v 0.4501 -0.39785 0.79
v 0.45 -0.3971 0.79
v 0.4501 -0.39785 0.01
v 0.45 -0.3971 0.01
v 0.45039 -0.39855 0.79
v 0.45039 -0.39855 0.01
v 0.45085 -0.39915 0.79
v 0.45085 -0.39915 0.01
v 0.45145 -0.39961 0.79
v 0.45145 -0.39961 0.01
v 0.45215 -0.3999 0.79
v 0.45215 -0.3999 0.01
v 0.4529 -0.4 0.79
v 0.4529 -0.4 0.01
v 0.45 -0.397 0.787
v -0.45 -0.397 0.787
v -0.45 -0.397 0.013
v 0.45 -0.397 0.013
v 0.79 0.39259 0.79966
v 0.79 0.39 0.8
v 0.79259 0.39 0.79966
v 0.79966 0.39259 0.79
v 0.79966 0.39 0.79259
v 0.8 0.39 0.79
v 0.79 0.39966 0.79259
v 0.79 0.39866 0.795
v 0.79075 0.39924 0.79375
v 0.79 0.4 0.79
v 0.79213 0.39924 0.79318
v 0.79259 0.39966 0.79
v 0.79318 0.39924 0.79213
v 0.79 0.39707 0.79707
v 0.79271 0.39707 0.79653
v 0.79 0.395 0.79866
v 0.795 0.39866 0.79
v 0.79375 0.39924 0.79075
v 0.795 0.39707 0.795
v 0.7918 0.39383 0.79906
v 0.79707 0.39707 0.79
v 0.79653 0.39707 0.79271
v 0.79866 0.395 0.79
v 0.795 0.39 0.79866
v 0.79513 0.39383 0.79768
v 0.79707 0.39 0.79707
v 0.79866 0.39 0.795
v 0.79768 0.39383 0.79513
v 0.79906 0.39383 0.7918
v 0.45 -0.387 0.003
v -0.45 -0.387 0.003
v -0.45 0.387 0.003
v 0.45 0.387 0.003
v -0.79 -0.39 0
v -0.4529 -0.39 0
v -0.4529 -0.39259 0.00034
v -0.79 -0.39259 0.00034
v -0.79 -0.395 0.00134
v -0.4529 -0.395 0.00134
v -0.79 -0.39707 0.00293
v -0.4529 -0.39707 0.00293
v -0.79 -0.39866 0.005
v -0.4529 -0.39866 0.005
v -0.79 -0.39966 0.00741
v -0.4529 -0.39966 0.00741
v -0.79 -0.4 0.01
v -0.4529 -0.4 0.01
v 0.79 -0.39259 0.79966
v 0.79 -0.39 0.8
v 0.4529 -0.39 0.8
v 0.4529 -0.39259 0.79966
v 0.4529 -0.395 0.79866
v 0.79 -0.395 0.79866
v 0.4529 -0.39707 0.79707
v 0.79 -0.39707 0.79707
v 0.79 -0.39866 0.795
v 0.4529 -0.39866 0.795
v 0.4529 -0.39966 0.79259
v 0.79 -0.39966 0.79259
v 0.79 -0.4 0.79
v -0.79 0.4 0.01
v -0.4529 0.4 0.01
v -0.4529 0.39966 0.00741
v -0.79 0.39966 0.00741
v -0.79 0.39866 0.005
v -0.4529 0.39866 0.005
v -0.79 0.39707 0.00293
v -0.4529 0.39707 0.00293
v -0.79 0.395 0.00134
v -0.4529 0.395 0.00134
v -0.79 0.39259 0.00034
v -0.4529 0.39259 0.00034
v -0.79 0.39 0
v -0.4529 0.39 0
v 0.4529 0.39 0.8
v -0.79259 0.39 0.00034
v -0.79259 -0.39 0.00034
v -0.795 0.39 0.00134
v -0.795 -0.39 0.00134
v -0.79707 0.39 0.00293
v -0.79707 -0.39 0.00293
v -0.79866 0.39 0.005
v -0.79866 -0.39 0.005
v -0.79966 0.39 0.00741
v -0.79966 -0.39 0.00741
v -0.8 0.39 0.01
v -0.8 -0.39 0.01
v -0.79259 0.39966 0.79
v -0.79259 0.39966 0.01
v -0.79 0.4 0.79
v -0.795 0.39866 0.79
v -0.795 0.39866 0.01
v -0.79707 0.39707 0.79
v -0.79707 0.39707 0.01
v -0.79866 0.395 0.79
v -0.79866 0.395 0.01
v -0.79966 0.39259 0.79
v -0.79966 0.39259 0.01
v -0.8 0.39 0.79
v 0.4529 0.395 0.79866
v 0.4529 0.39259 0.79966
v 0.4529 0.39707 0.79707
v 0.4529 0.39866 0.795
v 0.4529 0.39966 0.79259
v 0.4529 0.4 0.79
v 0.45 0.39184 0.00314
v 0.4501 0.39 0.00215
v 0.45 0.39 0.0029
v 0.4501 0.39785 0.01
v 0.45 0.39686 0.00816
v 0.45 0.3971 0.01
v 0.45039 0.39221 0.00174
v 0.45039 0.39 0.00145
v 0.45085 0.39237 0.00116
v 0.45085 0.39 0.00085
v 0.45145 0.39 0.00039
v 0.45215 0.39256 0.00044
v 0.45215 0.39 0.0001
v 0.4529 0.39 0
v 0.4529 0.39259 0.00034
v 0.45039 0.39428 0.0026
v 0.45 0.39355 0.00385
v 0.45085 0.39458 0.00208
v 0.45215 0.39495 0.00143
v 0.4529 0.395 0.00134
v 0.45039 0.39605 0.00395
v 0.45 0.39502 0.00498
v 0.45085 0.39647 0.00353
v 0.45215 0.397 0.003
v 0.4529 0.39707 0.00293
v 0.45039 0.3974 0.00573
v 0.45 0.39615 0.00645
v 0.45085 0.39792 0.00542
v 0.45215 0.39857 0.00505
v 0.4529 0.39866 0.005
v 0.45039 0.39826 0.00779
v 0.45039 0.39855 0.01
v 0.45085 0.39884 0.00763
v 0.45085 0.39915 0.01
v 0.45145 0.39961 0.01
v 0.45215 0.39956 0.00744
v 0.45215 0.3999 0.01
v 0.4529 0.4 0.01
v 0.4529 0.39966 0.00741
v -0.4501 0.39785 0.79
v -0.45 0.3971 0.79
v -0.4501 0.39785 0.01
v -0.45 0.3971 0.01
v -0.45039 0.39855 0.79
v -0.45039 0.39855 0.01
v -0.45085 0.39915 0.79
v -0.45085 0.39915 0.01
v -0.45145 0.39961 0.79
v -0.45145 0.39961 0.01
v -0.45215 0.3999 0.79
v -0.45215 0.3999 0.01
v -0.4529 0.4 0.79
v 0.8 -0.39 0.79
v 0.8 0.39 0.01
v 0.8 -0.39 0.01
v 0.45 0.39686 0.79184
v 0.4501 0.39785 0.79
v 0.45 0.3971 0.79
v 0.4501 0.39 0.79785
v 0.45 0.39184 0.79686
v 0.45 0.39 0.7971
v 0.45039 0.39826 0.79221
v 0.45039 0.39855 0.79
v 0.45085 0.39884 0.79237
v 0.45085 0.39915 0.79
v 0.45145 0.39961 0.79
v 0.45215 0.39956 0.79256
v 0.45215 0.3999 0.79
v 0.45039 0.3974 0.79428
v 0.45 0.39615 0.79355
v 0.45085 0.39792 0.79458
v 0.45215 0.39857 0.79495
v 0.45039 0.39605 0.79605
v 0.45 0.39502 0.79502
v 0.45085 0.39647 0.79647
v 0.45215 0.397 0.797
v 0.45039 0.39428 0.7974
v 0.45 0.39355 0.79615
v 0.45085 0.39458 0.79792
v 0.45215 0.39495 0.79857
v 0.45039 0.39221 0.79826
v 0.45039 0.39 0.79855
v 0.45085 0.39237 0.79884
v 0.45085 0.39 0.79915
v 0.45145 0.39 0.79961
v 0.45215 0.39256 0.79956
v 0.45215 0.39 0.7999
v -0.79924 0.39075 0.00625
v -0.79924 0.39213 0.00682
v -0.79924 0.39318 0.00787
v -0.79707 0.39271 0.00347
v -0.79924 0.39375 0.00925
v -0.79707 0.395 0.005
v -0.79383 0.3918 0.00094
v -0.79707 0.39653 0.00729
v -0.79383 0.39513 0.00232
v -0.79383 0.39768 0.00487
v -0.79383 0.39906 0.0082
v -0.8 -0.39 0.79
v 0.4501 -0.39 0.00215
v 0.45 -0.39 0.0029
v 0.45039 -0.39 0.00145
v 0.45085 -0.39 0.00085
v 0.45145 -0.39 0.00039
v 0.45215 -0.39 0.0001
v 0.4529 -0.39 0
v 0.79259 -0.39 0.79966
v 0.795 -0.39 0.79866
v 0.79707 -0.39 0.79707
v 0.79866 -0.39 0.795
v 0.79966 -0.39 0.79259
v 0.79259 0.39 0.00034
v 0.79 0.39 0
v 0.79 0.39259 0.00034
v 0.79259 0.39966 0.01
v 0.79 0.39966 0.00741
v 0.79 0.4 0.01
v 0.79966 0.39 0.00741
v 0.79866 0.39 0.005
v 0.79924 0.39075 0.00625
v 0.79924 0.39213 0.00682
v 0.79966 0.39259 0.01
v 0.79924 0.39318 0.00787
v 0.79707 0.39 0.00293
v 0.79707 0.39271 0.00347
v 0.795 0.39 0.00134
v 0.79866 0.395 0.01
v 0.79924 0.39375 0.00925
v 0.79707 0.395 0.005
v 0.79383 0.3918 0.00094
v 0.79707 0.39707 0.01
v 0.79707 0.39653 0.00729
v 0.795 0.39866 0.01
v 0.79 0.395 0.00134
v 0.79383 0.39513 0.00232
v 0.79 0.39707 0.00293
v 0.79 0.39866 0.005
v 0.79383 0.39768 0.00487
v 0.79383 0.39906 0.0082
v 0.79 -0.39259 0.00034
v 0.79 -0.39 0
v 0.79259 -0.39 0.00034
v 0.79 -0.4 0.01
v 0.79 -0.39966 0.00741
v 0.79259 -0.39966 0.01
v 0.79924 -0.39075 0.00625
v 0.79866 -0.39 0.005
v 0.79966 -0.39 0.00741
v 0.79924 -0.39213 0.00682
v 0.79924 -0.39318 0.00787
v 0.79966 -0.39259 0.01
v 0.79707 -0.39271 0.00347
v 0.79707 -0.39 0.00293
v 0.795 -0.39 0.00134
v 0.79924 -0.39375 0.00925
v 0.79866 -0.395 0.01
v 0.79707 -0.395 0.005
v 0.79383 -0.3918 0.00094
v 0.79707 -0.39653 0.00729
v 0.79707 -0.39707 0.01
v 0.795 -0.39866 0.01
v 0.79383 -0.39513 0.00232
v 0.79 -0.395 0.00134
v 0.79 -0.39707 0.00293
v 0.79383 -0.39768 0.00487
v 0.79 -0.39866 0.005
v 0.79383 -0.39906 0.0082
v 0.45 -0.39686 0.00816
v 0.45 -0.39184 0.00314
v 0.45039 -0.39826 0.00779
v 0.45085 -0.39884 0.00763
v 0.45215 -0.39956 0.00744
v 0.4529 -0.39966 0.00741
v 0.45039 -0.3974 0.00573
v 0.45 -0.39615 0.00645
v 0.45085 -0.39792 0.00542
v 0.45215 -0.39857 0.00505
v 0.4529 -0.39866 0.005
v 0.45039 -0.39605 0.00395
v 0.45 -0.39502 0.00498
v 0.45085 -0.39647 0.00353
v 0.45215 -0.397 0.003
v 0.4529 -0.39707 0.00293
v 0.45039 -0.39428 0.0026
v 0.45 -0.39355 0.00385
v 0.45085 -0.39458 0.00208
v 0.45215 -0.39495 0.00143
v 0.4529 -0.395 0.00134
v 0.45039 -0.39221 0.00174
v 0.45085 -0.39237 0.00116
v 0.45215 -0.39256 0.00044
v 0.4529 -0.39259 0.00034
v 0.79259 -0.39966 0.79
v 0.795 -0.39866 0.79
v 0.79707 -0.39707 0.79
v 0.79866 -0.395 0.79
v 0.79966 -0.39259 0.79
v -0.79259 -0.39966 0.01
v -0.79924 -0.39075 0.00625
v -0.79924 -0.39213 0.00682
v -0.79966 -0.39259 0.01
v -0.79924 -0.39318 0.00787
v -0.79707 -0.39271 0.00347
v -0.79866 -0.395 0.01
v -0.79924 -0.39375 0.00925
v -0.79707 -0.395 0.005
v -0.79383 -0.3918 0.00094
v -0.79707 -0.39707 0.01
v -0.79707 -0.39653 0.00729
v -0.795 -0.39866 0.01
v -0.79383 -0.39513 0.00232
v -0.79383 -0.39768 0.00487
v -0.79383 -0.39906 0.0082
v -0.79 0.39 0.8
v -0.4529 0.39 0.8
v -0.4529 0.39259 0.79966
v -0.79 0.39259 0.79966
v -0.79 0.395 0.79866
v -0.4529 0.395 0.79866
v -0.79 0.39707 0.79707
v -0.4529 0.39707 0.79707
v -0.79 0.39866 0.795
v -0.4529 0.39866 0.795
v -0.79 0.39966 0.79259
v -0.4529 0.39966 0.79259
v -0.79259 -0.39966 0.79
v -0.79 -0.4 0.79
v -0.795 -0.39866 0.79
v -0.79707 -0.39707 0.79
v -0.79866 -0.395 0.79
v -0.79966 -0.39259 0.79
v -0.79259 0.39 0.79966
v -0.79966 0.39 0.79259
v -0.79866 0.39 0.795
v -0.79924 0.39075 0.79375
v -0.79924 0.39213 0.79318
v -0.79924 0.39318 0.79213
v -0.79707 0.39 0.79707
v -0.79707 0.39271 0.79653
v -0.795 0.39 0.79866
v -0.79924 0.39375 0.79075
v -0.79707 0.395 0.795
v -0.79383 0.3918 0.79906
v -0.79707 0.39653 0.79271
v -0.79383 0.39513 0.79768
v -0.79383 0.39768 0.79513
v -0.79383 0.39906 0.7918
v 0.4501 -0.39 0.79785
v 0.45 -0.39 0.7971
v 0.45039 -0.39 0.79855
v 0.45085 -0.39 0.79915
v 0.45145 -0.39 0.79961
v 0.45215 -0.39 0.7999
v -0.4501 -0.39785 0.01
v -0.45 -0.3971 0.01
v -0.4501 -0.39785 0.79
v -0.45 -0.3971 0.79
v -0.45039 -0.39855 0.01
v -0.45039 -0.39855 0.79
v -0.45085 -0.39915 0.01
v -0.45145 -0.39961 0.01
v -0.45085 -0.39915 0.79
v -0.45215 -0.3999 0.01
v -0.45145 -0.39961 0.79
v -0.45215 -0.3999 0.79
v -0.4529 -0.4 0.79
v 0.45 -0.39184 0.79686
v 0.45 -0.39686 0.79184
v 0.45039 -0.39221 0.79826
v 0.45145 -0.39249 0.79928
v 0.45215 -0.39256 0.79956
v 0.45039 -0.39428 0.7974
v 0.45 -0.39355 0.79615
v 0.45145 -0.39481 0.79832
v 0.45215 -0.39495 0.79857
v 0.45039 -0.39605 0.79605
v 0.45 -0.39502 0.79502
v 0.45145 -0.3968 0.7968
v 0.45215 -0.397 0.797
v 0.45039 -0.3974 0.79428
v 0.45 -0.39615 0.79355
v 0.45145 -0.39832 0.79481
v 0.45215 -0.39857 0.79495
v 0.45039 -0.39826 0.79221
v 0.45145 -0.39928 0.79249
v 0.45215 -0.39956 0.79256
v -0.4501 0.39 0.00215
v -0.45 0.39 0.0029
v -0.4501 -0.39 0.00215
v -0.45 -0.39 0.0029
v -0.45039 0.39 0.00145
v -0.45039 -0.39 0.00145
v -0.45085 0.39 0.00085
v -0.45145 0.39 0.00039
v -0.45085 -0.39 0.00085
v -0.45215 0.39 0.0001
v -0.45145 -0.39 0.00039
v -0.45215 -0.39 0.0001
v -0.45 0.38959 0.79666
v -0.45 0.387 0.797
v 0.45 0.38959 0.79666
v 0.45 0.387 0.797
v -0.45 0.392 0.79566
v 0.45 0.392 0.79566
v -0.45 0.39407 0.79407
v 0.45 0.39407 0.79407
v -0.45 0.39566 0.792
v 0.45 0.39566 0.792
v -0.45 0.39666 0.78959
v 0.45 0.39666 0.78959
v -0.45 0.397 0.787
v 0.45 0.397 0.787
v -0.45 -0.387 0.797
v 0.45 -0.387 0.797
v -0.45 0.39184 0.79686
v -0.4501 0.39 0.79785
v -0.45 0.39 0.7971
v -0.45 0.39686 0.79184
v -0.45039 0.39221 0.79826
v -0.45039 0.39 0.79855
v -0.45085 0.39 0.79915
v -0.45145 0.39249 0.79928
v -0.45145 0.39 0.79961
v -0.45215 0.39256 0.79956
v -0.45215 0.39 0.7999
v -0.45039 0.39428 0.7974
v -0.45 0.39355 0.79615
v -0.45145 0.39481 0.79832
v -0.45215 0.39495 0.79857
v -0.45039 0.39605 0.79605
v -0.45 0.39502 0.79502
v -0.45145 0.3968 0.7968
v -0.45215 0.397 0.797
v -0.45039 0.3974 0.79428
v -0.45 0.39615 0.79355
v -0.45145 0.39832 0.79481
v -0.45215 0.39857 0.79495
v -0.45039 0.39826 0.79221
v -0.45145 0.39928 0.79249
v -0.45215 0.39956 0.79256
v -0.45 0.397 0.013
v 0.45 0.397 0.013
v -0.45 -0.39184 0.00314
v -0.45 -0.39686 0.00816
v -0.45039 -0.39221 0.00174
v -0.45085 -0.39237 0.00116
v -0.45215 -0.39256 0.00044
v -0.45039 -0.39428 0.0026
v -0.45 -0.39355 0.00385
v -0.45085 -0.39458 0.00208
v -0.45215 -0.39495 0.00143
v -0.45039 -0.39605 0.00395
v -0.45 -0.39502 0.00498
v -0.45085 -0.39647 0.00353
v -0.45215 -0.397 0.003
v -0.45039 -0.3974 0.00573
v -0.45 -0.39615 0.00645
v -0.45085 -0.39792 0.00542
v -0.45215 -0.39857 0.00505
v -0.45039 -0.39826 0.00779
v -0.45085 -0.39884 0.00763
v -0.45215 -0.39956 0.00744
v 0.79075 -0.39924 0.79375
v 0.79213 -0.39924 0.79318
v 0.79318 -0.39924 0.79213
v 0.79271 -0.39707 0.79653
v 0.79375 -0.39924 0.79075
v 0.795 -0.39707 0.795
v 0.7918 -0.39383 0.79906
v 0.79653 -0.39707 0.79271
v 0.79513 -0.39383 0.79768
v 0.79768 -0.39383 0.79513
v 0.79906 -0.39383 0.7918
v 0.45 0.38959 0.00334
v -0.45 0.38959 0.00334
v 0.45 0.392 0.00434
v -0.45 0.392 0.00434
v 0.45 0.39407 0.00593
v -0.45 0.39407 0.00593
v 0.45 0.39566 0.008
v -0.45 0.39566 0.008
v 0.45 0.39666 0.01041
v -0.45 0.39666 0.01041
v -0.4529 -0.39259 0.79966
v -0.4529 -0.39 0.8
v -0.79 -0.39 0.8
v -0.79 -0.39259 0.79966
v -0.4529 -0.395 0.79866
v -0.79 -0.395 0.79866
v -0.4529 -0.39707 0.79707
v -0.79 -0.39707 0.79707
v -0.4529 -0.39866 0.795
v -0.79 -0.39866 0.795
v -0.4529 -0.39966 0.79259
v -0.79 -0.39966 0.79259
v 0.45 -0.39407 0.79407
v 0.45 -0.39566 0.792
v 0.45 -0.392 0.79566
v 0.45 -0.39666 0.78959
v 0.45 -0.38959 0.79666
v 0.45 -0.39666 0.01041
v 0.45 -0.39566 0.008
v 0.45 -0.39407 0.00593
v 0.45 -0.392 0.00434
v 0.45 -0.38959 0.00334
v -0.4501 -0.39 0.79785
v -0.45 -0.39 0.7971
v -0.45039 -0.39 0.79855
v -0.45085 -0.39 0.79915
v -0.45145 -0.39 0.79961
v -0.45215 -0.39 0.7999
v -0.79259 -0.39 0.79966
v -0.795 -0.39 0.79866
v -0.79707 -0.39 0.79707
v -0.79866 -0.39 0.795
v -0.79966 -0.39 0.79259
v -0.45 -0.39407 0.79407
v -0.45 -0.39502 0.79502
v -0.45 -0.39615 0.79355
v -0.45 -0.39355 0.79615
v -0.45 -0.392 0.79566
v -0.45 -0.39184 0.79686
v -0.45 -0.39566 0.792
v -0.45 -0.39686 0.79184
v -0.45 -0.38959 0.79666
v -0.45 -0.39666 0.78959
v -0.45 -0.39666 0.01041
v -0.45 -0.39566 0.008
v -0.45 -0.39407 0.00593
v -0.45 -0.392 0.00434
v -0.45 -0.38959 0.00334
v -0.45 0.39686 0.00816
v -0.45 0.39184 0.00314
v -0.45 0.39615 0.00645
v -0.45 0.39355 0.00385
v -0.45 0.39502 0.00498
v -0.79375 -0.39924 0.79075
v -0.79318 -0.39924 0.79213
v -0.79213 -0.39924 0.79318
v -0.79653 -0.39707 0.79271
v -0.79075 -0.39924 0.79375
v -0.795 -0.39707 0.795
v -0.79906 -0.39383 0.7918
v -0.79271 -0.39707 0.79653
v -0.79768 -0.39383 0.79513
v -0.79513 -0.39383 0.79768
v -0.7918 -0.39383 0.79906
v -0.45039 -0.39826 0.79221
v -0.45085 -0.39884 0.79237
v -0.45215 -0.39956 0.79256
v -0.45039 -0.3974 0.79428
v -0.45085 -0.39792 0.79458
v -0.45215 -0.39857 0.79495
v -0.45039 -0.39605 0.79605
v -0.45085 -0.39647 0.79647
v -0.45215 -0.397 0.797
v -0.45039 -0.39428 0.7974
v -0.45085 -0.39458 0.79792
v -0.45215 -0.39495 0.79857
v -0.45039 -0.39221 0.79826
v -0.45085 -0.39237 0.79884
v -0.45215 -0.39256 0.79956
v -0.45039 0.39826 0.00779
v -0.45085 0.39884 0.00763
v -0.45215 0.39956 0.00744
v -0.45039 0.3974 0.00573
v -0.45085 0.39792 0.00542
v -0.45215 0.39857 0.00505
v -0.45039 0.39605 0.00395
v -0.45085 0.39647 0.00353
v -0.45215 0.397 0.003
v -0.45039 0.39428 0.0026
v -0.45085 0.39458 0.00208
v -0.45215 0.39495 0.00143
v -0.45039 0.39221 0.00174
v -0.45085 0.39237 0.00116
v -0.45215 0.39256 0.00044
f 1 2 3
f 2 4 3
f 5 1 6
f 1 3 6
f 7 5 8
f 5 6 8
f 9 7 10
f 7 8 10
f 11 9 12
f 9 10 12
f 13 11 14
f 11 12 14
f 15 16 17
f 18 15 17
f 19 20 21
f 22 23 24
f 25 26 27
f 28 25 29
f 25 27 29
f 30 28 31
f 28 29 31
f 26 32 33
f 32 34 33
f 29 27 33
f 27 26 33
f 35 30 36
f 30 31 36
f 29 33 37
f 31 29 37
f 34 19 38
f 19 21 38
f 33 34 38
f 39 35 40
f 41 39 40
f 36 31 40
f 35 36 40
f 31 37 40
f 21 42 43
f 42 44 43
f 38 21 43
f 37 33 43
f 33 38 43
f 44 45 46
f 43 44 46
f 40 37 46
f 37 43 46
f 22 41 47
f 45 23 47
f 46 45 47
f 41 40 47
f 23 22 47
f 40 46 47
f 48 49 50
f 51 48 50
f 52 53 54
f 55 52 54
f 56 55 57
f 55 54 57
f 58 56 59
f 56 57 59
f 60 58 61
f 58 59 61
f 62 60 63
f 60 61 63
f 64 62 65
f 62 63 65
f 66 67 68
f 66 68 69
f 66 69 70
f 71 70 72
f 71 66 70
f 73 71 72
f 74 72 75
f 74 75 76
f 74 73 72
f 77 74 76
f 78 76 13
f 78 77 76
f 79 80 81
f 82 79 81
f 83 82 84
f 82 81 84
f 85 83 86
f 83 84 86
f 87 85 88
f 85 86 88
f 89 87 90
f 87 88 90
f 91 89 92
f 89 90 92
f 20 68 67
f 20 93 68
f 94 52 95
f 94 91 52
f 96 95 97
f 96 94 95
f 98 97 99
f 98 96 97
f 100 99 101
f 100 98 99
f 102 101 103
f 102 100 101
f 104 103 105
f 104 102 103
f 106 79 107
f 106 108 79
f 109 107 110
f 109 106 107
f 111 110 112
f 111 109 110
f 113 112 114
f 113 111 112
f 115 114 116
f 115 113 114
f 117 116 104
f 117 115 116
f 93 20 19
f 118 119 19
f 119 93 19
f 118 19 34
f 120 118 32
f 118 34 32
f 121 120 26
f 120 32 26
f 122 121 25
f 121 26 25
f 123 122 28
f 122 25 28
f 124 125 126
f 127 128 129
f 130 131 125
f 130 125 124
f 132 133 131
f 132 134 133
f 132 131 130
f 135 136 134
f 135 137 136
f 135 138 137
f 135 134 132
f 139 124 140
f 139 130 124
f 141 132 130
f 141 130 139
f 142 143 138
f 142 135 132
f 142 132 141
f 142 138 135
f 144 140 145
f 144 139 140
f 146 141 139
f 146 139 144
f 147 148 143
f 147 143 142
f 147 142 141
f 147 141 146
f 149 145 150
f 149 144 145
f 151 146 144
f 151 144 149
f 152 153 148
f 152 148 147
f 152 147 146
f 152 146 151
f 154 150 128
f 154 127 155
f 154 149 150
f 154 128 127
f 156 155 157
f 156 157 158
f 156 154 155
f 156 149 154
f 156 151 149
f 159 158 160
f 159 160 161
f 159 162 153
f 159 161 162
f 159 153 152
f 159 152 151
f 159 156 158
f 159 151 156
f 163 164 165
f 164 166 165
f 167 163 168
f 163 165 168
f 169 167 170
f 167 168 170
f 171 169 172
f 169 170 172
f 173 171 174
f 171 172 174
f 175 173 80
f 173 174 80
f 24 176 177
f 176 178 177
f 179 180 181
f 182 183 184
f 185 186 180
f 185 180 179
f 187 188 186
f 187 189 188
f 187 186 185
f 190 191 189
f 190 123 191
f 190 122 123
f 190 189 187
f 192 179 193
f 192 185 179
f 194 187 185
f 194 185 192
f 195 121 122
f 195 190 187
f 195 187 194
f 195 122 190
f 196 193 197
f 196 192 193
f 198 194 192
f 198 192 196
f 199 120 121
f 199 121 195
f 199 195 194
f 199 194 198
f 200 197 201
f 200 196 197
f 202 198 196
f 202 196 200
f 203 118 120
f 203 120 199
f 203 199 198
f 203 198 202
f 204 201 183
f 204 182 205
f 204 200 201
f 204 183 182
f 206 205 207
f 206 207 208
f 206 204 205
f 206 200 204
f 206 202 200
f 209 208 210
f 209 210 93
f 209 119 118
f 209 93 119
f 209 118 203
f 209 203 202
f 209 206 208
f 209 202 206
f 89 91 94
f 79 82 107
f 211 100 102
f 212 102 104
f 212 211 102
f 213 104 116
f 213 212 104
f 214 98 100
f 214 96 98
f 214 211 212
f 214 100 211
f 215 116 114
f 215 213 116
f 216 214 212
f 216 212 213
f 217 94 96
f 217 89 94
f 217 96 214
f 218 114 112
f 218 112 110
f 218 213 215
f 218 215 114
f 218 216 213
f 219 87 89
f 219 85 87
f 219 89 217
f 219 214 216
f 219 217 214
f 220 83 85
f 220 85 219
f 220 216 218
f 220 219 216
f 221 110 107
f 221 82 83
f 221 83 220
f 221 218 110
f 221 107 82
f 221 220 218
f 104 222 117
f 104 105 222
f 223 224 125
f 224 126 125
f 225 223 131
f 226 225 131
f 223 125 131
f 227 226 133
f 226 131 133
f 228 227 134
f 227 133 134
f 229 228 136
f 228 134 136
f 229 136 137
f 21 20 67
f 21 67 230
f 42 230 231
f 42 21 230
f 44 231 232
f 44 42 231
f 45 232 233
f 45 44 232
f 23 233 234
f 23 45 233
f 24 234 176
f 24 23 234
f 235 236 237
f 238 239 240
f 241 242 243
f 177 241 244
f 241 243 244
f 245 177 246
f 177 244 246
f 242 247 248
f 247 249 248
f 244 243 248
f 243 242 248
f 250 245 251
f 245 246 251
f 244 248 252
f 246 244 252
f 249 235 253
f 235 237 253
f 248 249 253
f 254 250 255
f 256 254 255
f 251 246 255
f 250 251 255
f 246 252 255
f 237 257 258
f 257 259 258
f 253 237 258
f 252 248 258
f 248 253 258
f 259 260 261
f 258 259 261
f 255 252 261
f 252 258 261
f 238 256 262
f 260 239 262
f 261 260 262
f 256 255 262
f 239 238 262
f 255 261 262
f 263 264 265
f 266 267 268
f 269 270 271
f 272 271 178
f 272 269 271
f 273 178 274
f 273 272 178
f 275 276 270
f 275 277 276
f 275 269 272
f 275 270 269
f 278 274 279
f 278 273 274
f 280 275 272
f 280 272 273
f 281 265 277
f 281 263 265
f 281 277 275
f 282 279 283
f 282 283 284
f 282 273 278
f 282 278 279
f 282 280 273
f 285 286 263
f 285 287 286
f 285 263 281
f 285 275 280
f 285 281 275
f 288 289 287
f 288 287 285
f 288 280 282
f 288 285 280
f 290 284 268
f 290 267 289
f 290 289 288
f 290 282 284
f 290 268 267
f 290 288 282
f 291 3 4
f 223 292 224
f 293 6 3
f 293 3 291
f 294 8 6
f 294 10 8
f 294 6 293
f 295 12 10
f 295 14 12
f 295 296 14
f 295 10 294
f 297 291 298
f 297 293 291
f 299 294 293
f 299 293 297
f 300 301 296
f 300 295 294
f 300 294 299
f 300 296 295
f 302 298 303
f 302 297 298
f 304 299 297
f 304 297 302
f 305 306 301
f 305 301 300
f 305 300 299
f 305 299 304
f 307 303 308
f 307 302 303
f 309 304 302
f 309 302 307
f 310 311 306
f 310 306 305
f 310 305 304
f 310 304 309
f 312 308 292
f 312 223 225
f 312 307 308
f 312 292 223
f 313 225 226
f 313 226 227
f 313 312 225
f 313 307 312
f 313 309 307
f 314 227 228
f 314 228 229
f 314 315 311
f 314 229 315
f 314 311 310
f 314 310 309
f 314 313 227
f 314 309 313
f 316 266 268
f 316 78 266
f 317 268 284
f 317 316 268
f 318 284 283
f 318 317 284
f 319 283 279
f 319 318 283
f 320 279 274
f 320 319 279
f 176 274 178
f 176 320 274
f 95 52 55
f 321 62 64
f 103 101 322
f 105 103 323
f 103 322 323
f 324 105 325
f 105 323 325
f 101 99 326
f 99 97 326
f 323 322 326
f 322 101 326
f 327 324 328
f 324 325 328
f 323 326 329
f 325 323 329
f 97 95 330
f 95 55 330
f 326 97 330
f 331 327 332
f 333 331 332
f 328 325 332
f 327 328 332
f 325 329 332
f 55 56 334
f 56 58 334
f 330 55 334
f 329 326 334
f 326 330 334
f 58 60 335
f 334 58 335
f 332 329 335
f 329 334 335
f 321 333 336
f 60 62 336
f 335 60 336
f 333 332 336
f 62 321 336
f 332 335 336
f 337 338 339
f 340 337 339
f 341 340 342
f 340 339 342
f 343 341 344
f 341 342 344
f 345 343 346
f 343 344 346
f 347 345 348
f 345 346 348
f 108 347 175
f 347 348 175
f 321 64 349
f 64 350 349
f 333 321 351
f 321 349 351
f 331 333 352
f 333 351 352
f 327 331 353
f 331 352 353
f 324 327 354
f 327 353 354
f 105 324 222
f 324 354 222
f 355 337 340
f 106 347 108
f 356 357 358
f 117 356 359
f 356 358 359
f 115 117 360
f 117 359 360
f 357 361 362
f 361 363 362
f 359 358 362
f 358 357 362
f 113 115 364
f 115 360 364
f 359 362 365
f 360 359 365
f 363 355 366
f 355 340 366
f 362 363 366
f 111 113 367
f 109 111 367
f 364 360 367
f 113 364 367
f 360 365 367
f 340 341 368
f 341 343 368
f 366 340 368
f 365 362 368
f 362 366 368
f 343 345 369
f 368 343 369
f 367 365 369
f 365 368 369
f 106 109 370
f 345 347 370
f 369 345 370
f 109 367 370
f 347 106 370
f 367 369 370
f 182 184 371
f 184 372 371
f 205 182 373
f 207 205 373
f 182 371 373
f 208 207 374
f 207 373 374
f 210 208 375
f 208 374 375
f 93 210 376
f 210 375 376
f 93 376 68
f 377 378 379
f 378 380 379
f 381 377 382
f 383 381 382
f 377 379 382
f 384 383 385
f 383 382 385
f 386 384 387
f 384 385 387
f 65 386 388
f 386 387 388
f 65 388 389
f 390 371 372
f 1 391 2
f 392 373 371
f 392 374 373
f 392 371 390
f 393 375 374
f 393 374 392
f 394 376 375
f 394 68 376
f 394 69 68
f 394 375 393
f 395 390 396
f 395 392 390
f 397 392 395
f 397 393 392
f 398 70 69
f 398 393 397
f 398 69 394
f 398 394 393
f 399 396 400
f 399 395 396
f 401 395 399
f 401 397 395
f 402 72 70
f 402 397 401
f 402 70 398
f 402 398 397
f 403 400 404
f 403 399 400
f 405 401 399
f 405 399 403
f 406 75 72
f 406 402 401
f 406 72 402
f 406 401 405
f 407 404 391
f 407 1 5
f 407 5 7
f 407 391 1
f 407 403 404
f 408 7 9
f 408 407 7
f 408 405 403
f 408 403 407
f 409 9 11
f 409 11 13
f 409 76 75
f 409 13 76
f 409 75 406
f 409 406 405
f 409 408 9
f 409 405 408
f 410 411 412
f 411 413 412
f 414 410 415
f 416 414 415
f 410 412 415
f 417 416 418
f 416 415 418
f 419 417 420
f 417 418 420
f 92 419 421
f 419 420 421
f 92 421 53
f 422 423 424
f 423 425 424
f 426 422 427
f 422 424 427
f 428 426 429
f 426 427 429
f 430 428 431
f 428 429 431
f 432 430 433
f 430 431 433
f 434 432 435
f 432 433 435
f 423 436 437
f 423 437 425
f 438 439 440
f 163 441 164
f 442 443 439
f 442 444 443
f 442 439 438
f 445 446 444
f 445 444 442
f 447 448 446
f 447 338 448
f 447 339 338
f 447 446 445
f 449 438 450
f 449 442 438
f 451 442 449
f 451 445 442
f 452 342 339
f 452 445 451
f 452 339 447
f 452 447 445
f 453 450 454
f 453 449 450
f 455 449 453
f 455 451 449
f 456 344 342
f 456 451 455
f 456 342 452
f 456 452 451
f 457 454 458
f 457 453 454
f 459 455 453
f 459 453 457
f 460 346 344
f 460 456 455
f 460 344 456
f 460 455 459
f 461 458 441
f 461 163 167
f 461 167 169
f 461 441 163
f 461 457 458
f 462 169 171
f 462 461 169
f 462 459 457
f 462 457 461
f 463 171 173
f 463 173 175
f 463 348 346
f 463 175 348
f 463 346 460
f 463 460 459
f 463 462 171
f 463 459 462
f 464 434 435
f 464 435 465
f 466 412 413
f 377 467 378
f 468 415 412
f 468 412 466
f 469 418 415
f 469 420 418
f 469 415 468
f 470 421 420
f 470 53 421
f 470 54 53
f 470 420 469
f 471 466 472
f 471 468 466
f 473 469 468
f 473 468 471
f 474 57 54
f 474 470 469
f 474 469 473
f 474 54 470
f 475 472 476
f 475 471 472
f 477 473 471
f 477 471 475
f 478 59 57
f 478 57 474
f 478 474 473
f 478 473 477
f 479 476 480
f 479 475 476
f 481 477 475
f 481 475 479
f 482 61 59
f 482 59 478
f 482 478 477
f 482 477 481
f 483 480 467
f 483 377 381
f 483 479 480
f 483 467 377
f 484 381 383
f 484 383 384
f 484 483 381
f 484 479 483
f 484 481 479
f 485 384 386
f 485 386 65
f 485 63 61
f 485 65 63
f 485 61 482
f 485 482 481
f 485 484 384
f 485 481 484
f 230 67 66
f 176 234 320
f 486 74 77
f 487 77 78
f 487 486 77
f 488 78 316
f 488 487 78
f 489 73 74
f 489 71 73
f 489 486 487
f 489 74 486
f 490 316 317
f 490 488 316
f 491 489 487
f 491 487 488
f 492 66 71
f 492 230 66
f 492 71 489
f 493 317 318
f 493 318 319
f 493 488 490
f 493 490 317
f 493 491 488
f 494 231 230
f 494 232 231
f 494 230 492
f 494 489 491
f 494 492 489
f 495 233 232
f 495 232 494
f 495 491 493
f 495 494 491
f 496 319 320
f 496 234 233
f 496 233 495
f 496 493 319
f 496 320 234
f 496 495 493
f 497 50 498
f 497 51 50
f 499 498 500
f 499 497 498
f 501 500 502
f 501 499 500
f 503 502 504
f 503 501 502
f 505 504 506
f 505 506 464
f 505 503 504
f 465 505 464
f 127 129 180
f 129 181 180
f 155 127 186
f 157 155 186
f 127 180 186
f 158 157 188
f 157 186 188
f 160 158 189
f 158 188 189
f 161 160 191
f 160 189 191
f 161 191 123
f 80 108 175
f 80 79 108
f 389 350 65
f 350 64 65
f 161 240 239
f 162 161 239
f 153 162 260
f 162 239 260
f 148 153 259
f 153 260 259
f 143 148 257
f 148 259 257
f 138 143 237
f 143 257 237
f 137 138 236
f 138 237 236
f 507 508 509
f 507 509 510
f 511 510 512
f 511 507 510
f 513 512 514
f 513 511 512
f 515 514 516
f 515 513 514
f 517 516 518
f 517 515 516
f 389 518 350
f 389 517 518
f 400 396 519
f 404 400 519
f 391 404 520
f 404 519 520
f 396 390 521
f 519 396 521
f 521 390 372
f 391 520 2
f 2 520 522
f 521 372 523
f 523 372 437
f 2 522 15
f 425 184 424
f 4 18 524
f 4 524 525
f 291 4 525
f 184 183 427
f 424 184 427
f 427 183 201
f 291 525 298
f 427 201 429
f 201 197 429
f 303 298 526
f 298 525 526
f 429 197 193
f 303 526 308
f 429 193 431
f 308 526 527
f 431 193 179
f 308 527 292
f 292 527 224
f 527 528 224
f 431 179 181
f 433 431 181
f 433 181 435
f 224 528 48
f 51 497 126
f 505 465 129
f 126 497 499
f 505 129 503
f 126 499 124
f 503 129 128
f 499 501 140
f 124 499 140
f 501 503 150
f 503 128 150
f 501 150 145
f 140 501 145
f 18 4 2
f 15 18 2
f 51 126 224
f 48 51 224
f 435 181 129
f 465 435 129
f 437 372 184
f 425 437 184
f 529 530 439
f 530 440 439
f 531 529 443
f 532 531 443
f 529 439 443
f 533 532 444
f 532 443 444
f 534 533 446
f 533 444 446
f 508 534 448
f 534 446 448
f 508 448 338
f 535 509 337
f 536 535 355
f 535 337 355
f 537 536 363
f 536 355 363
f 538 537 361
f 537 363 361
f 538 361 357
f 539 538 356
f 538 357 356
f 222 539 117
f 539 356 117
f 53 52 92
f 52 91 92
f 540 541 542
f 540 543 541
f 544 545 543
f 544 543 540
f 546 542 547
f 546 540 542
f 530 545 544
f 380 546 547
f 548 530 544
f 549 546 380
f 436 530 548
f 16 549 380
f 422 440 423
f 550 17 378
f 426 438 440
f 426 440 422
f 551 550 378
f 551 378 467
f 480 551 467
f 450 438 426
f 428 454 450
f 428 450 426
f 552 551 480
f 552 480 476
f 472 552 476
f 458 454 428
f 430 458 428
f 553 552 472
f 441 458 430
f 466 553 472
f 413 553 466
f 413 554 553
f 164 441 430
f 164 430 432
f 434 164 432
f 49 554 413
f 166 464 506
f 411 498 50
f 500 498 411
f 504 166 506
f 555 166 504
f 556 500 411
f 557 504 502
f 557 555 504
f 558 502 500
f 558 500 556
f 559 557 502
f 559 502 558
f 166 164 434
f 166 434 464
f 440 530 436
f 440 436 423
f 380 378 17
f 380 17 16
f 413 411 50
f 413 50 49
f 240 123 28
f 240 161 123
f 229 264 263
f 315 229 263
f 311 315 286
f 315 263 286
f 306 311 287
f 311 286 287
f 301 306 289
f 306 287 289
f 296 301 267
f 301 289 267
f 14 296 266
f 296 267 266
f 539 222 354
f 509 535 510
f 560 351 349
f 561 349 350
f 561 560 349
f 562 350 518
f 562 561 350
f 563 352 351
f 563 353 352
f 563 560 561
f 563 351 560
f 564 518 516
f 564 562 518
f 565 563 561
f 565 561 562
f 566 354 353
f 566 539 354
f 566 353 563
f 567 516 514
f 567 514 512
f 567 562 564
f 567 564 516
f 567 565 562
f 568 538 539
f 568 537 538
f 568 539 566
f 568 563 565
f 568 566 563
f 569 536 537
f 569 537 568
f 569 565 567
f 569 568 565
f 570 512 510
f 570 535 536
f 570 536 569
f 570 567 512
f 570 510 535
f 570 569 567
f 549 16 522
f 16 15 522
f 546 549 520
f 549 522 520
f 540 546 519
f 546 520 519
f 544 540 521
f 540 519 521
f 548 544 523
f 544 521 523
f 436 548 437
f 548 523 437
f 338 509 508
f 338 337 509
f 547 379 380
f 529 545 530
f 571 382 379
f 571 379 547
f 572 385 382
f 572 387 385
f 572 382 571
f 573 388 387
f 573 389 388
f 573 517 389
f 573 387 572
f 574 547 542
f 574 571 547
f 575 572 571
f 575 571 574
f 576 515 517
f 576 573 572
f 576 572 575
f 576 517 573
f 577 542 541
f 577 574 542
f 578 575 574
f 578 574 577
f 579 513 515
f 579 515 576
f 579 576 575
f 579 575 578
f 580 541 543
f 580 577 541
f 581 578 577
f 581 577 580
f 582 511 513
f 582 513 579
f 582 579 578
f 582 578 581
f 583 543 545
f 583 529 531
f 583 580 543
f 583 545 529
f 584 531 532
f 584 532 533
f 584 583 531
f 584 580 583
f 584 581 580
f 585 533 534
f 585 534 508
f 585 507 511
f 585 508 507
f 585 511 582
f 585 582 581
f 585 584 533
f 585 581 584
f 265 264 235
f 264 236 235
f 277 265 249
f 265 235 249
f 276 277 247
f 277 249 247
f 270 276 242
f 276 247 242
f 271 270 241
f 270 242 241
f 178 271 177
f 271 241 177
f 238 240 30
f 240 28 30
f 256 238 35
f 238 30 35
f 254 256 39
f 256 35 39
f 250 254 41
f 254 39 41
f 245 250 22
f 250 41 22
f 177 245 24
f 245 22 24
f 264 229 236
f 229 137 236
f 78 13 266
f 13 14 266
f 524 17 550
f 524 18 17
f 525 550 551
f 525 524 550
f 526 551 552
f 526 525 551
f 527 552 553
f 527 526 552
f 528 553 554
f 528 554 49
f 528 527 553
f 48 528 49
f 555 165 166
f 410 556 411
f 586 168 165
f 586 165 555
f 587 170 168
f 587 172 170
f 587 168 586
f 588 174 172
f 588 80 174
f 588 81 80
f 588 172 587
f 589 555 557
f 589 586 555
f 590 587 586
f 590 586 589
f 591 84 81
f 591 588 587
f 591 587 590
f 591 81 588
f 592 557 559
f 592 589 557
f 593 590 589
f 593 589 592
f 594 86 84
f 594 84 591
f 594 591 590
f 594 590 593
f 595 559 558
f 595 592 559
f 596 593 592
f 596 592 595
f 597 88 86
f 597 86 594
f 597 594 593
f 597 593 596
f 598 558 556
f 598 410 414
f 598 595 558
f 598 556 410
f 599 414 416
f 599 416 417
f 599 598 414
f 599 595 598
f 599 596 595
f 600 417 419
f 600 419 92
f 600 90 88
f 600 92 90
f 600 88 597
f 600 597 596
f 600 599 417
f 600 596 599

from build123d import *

# Parameters (mm, degrees)
SKETCH1_W                           = 1.6
SKETCH1_H                           = 0.8
ALL_BODY_DEPTH                      = 0.8
CUT_OUT_THE_BODY_FOR_PIN_DEPTH      = 0.45
CUT_OUT_THE_BODY_FOR_PIN_DEPTH_BACK = 0.45
SKETCH2_OUTSIDE_W                   = 3.192
SKETCH2_OUTSIDE_H                   = 3.192
SKETCH2_OUTSIDE_W_2                 = 0.794
SKETCH2_OUTSIDE_H_2                 = 0.794
BODY_FILLET_R                       = 0.01
PIN_FILLET_A_R                      = 0.01
PIN_FILLET_B_R                      = 0.003


with BuildPart() as part:
    # Sketch1 → All body (new body)
    with BuildSketch(Plane.XY):
        Rectangle(SKETCH1_W, SKETCH1_H)
    extrude(amount=ALL_BODY_DEPTH)

    # Sketch2 outside → Cut out the body for pin (cut, two sides: drawn at the far end of the back side and taken through both)
    with BuildSketch(Plane(origin=(0, 0, 0), x_dir=(0, 0, -1), z_dir=(1, 0, 0)).offset(-CUT_OUT_THE_BODY_FOR_PIN_DEPTH_BACK)):
        with Locations((-0.4, 0)):
            Rectangle(SKETCH2_OUTSIDE_W, SKETCH2_OUTSIDE_H)
        with Locations((-0.4, 0)):
            Rectangle(SKETCH2_OUTSIDE_W_2, SKETCH2_OUTSIDE_H_2, mode=Mode.SUBTRACT)
    extrude(amount=CUT_OUT_THE_BODY_FOR_PIN_DEPTH + CUT_OUT_THE_BODY_FOR_PIN_DEPTH_BACK, mode=Mode.SUBTRACT)

    # Body fillet
    body_fillet_edges = [part.edges().sort_by_distance(p)[0] for p in [
        (0, 0.397, 0.003),
        (0, 0.397, 0.797),
        (0, -0.397, 0.797),
        (0, -0.397, 0.003),
    ]]
    fillet(body_fillet_edges, radius=BODY_FILLET_R)

    # Pin fillet a
    pin_fillet_a_edges = [part.edges().sort_by_distance(p)[0] for p in [
        (0.8, 0, 0.8),
        (-0.625, 0.4, 0),
        (0.625, -0.4, 0),
        (0.625, -0.4, 0.8),
        (-0.625, 0.4, 0.8),
        (0.625, 0.4, 0.8),
        (-0.8, 0, 0.8),
        (0.625, 0.4, 0),
        (0.8, 0, 0),
        (-0.625, -0.4, 0),
        (-0.8, 0, 0),
        (-0.8, 0.4, 0.4),
        (0.8, 0.4, 0.4),
        (0.8, -0.4, 0.4),
        (-0.8, -0.4, 0.4),
        (-0.625, -0.4, 0.8),
    ]]
    fillet(pin_fillet_a_edges, radius=PIN_FILLET_A_R)

    # Pin fillet b
    pin_fillet_b_edges = [part.edges().sort_by_distance(p)[0] for p in [
        (0.45, -0.4, 0.4),
        (0.45, 0, 0.8),
        (0.45, 0.4, 0.4),
        (0.45, 0, 0),
        (-0.45, 0.4, 0.4),
        (-0.45, 0, 0.8),
        (-0.45, -0.4, 0.4),
        (-0.45, 0, 0),
        (0.45, 0.397071068, 0.002928932),
        (0.45, -0.397071068, 0.002928932),
        (0.45, -0.397071068, 0.797071068),
        (0.45, 0.397071068, 0.797071068),
        (-0.45, -0.397071068, 0.797071068),
        (-0.45, 0.397071068, 0.797071068),
        (-0.45, -0.397071068, 0.002928932),
        (-0.45, 0.397071068, 0.002928932),
    ]]
    fillet(pin_fillet_b_edges, radius=PIN_FILLET_B_R - 0.0001)  # a hair under: the kernel refuses the full size


solid = part.part
